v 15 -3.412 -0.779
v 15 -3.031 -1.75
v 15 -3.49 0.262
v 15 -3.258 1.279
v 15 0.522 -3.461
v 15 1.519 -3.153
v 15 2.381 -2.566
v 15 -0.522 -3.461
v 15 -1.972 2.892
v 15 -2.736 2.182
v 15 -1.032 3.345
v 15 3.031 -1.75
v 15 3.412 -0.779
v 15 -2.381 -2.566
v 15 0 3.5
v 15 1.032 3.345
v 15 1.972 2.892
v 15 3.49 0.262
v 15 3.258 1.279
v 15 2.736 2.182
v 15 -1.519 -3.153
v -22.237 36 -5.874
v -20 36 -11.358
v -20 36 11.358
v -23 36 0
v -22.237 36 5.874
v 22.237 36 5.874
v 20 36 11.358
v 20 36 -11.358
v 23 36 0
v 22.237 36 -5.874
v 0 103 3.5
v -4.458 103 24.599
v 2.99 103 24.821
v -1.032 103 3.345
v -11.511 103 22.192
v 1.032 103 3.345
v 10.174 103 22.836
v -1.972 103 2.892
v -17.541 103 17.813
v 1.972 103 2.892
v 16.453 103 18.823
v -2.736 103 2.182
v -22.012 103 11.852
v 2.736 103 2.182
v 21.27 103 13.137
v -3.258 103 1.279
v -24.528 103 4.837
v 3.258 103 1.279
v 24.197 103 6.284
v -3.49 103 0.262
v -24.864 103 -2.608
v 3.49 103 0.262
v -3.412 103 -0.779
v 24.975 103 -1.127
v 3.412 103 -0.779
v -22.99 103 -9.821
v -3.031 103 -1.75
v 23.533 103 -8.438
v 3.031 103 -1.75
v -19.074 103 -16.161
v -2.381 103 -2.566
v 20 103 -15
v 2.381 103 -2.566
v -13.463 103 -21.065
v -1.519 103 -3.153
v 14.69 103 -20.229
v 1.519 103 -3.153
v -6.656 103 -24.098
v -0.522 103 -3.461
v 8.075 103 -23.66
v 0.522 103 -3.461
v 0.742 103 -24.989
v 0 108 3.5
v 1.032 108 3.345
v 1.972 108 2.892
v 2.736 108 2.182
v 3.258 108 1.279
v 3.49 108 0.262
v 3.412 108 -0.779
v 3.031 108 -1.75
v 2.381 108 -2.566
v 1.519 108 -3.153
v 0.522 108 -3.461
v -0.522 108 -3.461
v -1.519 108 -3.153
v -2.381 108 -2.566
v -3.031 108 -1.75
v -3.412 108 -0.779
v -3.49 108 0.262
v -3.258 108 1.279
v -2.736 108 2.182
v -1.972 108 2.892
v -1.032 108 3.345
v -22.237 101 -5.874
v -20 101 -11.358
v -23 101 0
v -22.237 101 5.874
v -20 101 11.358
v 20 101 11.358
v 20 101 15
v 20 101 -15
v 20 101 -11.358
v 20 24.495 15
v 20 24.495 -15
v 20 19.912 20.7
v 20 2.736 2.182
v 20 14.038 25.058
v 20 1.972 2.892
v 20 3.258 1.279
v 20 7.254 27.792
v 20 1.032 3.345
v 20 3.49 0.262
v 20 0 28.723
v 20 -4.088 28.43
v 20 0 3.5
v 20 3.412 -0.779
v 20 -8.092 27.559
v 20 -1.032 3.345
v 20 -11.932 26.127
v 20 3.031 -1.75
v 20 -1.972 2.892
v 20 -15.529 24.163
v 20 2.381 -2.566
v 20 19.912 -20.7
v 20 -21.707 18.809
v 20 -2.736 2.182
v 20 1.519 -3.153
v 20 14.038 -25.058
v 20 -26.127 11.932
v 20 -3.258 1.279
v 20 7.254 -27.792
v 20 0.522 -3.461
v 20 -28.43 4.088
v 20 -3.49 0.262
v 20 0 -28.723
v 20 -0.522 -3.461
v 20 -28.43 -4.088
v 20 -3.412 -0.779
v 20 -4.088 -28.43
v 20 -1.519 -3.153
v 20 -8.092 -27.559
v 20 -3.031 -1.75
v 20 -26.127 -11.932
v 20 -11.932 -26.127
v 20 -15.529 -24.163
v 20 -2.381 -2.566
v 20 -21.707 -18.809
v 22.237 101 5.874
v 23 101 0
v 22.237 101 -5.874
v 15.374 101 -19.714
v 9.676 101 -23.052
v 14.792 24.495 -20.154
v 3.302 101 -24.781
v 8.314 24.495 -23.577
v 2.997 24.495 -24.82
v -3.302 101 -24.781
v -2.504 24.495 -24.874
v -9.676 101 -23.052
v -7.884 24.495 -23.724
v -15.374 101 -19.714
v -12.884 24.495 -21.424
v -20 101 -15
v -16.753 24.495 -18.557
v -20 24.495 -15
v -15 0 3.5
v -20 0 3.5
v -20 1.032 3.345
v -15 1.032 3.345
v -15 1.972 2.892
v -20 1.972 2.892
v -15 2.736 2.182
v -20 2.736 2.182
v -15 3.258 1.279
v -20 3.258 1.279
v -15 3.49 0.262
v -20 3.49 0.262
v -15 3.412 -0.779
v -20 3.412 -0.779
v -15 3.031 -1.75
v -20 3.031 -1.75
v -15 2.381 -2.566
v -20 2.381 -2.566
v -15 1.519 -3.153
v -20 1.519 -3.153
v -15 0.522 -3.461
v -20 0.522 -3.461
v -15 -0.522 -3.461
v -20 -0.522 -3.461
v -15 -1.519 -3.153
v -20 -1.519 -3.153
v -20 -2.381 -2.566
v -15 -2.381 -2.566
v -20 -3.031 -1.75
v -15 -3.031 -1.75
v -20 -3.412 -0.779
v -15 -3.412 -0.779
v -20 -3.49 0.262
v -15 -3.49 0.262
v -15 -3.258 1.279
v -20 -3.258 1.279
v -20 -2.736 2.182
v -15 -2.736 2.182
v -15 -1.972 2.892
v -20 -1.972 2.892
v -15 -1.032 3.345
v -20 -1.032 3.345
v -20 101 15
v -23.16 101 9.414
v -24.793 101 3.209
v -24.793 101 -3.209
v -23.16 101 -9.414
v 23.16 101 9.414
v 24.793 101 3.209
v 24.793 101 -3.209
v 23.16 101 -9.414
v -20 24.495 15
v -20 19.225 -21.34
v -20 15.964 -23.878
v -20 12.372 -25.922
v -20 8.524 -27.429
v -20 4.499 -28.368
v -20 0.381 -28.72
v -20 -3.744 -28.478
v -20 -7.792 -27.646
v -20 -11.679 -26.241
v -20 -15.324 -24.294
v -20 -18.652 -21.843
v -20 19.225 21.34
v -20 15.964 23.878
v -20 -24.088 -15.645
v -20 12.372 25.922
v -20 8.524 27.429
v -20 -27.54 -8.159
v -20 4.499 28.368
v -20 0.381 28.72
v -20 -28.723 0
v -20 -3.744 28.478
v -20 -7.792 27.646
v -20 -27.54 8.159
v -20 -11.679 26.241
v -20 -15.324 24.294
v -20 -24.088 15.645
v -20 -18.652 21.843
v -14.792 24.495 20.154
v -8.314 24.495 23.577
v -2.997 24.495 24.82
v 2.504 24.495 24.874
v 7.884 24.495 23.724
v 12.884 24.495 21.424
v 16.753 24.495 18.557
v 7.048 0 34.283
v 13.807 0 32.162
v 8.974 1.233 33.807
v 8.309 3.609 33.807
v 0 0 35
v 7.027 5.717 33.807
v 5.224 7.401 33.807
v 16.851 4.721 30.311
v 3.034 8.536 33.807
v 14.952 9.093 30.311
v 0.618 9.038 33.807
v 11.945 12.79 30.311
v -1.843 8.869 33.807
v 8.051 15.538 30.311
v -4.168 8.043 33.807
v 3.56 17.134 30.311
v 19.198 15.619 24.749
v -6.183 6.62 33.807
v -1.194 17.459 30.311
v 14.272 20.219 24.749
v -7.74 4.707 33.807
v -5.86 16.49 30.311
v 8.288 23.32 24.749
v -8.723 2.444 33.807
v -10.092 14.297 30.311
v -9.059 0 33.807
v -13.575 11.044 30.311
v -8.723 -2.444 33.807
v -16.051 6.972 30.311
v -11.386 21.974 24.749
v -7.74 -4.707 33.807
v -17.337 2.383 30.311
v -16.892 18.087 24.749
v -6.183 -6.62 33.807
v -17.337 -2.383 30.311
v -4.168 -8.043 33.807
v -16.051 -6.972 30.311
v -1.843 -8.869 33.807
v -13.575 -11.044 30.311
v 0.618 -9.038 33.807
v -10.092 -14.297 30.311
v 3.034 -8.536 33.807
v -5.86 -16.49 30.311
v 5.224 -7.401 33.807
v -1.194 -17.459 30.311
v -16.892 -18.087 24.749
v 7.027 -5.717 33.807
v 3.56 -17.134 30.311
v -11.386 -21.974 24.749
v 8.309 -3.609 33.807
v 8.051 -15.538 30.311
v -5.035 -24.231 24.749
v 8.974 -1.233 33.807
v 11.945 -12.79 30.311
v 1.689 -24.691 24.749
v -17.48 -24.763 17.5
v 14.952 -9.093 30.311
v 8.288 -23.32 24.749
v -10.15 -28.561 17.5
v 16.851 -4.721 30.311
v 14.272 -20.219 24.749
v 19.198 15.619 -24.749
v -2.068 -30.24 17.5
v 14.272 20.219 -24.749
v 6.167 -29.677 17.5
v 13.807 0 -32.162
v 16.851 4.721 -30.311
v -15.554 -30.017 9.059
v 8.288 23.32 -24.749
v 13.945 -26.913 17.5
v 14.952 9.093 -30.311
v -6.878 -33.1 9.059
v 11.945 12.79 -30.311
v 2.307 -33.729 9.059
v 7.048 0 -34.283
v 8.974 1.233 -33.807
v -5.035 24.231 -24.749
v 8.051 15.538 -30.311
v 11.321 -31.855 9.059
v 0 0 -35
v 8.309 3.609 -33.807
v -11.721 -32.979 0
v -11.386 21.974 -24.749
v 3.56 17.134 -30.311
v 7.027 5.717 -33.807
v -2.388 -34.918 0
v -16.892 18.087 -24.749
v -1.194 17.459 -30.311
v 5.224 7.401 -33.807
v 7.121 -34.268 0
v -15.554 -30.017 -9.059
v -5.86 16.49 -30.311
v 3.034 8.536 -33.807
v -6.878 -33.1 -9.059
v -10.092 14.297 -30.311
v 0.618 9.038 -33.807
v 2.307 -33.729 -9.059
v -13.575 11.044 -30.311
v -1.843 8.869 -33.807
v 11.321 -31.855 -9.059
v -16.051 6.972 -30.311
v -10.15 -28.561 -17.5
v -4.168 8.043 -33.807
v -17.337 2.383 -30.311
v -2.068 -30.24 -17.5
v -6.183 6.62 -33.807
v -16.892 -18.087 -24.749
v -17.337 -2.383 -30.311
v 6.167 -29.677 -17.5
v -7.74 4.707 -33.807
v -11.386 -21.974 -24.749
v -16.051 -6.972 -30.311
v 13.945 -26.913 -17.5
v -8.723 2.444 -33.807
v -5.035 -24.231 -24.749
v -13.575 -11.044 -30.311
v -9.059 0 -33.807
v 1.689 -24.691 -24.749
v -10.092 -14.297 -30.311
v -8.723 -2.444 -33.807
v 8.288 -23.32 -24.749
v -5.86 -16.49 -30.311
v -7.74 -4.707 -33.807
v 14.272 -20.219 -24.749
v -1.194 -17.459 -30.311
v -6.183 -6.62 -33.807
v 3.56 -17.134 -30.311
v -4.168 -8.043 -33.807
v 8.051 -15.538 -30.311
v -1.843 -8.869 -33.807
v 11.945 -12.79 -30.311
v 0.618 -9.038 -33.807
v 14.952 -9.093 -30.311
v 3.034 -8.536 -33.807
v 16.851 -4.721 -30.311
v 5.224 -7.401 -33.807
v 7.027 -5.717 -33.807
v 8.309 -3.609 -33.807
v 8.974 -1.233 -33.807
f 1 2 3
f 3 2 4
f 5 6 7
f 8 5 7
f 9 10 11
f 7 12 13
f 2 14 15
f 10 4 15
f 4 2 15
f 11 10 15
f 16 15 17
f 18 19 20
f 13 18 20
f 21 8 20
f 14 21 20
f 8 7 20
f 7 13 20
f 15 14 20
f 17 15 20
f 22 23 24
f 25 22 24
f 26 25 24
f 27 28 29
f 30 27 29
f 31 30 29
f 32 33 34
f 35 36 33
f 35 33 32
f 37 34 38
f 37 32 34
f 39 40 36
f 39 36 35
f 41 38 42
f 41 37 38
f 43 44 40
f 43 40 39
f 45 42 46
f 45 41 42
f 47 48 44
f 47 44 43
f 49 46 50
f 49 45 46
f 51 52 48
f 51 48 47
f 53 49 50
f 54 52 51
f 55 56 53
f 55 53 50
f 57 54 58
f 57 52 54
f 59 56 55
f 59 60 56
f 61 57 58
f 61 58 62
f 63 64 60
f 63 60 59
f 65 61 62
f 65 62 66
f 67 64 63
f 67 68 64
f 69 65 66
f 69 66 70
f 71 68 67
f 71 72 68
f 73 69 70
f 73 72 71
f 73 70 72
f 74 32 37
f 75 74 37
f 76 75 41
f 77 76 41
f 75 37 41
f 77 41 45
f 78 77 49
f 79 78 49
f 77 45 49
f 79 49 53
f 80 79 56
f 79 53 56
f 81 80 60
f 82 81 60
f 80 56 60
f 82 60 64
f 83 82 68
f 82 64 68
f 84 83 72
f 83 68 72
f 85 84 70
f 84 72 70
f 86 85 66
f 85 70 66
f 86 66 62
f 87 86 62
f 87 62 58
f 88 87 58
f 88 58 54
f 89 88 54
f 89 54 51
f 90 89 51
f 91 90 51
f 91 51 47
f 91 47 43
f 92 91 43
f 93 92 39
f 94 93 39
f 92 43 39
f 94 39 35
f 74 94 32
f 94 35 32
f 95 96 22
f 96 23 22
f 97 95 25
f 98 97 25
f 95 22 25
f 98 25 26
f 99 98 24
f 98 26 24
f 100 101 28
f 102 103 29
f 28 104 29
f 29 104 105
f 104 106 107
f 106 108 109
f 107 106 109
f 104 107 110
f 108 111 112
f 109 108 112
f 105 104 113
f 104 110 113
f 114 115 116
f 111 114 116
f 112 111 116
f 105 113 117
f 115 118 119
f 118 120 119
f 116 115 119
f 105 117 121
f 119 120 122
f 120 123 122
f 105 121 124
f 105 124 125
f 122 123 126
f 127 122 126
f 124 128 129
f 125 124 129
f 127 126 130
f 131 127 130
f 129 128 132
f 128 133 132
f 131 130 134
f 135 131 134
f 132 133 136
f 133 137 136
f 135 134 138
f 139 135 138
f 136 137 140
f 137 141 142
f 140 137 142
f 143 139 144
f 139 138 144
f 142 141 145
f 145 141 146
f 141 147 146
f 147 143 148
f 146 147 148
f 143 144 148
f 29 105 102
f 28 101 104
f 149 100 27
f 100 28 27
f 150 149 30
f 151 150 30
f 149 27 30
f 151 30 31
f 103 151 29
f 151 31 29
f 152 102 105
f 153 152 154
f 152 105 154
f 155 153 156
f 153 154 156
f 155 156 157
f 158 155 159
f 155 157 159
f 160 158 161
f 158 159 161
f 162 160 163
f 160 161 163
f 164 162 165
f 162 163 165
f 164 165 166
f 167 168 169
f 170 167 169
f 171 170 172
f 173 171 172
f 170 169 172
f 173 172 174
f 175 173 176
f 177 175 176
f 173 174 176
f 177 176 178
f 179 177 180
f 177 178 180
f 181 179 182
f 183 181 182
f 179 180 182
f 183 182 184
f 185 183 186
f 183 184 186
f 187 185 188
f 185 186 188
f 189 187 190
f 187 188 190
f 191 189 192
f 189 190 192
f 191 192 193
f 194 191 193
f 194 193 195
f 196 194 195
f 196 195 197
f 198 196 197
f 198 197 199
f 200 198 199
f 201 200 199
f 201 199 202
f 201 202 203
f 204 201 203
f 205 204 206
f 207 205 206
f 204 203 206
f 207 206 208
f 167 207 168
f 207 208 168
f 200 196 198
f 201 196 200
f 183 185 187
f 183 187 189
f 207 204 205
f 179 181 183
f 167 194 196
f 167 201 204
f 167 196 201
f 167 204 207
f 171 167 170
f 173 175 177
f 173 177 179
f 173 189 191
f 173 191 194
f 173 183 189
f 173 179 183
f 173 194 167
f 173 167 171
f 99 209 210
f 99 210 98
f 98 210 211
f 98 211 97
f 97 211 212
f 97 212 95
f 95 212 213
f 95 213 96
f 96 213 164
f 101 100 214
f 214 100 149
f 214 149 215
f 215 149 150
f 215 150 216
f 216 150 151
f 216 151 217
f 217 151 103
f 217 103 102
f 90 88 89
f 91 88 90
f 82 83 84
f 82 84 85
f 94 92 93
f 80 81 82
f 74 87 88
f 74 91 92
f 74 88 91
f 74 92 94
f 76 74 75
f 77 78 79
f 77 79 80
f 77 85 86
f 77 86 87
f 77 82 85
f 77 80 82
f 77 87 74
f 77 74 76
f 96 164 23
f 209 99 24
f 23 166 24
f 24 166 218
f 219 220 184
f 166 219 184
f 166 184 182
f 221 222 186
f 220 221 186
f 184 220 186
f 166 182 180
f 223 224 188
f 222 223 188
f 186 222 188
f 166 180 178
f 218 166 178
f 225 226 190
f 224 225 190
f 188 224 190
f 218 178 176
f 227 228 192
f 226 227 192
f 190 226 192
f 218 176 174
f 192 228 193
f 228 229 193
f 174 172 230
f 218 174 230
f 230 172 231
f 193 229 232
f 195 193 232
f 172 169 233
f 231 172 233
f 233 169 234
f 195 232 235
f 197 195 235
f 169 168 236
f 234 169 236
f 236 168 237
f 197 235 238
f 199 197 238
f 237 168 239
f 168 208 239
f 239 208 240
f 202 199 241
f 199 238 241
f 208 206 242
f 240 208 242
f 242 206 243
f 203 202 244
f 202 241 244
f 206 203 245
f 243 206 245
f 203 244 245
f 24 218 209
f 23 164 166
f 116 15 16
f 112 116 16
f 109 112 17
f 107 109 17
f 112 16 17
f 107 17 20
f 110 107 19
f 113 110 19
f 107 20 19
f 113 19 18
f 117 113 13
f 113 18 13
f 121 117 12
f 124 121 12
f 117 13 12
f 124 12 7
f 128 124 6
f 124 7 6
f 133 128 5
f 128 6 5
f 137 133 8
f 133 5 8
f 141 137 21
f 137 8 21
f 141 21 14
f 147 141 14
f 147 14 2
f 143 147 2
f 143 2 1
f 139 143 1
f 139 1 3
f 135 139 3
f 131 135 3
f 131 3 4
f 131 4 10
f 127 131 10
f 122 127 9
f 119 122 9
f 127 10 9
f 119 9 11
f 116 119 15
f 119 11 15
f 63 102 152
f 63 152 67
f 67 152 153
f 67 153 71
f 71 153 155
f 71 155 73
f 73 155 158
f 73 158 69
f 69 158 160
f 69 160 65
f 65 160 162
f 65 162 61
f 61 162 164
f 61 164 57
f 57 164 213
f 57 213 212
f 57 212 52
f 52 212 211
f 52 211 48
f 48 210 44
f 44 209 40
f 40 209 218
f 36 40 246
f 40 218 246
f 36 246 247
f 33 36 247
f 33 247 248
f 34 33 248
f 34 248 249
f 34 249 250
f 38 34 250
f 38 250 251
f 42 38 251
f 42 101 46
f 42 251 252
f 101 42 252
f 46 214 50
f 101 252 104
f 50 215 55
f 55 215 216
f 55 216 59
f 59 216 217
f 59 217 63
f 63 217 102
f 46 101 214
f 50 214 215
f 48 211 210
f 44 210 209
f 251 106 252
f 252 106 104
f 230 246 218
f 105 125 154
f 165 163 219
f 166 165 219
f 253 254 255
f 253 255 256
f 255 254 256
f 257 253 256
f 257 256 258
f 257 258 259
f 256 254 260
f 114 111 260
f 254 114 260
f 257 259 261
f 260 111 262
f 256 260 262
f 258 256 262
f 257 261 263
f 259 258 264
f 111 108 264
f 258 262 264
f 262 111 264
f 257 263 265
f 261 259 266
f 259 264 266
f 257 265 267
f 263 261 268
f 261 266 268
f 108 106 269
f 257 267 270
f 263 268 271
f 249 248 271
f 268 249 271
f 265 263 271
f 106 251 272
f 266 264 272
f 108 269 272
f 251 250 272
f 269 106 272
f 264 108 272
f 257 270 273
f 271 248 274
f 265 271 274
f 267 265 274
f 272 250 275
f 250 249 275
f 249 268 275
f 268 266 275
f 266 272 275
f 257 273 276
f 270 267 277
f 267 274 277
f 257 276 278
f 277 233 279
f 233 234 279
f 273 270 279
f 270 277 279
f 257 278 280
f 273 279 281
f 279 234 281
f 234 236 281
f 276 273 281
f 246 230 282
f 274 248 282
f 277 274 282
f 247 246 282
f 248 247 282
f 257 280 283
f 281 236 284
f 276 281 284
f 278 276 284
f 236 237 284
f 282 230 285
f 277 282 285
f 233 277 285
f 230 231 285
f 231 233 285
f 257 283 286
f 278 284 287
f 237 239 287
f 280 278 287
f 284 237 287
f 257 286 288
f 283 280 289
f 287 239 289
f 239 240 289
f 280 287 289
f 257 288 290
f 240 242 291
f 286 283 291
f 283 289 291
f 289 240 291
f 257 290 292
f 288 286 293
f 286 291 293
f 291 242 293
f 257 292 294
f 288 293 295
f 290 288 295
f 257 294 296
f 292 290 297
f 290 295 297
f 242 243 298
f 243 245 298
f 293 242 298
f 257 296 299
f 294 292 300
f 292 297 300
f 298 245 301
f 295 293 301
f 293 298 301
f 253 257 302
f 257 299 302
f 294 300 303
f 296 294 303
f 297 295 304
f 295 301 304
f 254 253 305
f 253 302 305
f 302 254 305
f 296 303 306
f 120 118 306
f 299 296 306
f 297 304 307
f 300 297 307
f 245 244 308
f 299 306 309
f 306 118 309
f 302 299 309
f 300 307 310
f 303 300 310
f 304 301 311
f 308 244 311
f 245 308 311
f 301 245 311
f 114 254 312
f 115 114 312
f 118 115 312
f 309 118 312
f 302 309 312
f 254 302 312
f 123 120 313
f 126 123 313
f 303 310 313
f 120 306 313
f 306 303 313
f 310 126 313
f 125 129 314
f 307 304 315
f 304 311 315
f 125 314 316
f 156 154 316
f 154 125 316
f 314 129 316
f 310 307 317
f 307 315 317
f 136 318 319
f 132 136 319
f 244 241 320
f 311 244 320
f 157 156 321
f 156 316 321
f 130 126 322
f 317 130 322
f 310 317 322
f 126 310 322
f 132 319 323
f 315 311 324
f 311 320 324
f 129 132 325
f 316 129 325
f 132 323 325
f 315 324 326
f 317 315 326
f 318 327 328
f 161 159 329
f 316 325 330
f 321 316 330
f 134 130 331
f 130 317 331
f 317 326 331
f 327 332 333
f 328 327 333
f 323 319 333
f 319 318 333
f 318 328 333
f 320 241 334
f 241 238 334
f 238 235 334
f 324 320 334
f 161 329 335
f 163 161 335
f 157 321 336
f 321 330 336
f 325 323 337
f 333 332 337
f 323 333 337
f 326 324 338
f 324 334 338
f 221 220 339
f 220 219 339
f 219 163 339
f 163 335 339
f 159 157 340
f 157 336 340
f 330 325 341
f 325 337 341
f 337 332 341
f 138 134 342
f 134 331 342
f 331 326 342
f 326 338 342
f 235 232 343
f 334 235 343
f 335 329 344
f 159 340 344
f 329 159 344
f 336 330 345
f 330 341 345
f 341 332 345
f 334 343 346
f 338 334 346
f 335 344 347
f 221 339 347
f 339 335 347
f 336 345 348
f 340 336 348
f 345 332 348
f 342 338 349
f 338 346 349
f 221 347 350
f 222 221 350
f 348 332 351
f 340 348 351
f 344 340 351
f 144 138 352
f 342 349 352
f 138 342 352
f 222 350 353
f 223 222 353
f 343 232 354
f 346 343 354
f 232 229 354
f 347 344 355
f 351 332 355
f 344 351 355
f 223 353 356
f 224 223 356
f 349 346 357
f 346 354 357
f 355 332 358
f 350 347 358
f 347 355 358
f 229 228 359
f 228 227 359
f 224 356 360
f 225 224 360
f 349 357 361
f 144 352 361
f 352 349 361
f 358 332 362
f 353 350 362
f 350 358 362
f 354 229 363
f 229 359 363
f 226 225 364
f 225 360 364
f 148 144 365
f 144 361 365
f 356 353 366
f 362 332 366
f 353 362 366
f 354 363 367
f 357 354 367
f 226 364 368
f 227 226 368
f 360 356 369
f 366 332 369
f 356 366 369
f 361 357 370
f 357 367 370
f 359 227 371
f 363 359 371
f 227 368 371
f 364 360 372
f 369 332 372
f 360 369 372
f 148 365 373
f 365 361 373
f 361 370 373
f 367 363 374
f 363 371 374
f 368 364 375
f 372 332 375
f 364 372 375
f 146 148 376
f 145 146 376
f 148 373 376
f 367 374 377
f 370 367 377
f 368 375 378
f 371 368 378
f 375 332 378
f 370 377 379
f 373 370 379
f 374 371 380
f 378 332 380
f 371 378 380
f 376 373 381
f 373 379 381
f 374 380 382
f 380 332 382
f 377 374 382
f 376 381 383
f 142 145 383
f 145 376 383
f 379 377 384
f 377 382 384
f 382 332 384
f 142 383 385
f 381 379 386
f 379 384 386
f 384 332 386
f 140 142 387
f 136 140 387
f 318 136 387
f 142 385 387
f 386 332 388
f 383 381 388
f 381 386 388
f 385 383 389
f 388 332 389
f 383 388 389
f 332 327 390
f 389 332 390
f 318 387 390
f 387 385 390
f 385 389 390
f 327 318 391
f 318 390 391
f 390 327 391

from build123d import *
from build123d.topology import SkipClean

# Parameters (mm, degrees)
CUT_EXTRUDE1_DEPTH      = 35
CUT_EXTRUDE1_DEPTH_BACK = 35
SKETCH2_OUTSIDE_W       = 96.248
SKETCH2_OUTSIDE_H       = 96.248
BOSS_EXTRUDE1_DEPTH     = 36
SKETCH4_R               = 3.5
CUT_EXTRUDE2_DEPTH      = 5
LPATTERN1_COUNT         = 2
LPATTERN1_PITCH         = 35
BOSS_EXTRUDE2_DEPTH     = 50
BOSS_EXTRUDE6_DEPTH     = 15
SKETCH10_R              = 25
BOSS_EXTRUDE7_DEPTH     = 2
SKETCH11_R              = 3.5
BOSS_EXTRUDE8_DEPTH     = 5


with BuildPart() as part:
    # Sketch1 → Revolve2 (revolve)
    with BuildSketch(Plane(origin=(0, 0, 0), x_dir=(1, 0, 0), z_dir=(0, 1, 0))):
        with BuildLine():
            Line((0, 35), (0, -35))
            ThreePointArc((0, -35), (35, 0), (0, 35))
        make_face()
    revolve(axis=Axis((0, 0, -35), (0, 0, 1)))

    # Sketch2 outside → Cut-Extrude1 (cut, two sides: drawn at the far end of the back side and taken through both)
    with SkipClean():  # the faces are left unmerged after this step: merging them gives an invalid solid
        with BuildSketch(Plane(origin=(0, 0, 0), x_dir=(1, 0, 0), z_dir=(0, 1, 0)).offset(-CUT_EXTRUDE1_DEPTH_BACK)):
            Rectangle(SKETCH2_OUTSIDE_W, SKETCH2_OUTSIDE_H)
            with BuildLine():
                Line((-20, -28.722813233), (-20, 28.722813233))
                ThreePointArc((-20, 28.722813233), (0, 35), (20, 28.722813233))
                Line((20, 28.722813233), (20, -28.722813233))
                ThreePointArc((20, -28.722813233), (0, -35), (-20, -28.722813233))
            make_face(mode=Mode.SUBTRACT)
        extrude(amount=CUT_EXTRUDE1_DEPTH + CUT_EXTRUDE1_DEPTH_BACK, mode=Mode.SUBTRACT)

    # Sketch3 → Boss-Extrude1 (add)
    with BuildSketch(Plane(origin=(0, 0, 0), x_dir=(1, 0, 0), z_dir=(0, 1, 0))):
        with BuildLine():
            Line((-20, 15), (-20, -15))
            ThreePointArc((-20, -15), (0, -25), (20, -15))
            Line((20, -15), (20, 15))
            ThreePointArc((20, 15), (0, 25), (-20, 15))
        make_face()
    extrude(amount=BOSS_EXTRUDE1_DEPTH)

    # Sketch4 → Cut-Extrude2 (cut)
    with BuildSketch(Plane.ZY.offset(20)):
        Circle(SKETCH4_R)
    cut_extrude2 = extrude(amount=-CUT_EXTRUDE2_DEPTH, mode=Mode.SUBTRACT)

    # LPattern1: Cut-Extrude2 ×2
    with Locations(*[(i * LPATTERN1_PITCH, 0, 0) for i in range(1, LPATTERN1_COUNT)]):
        add(cut_extrude2, mode=Mode.SUBTRACT)

    # Sketch5 → Boss-Extrude2 (add)
    with BuildSketch(Plane(origin=(0, 36, 0), x_dir=(1, 0, 0), z_dir=(0, 1, 0))):
        with BuildLine():
            Line((-20, 15), (-20, 11.357816692))
            ThreePointArc((-20, 11.357816692), (-23, 0), (-20, -11.357816692))
            Line((-20, -11.357816692), (-20, -15))
            ThreePointArc((-20, -15), (0, -25), (20, -15))
            Line((20, -15), (20, -11.357816692))
            ThreePointArc((20, -11.357816692), (23, 0), (20, 11.357816692))
            Line((20, 11.357816692), (20, 15))
            ThreePointArc((20, 15), (0, 25), (-20, 15))
        make_face()
    extrude(amount=BOSS_EXTRUDE2_DEPTH)

    # Sketch9 → Boss-Extrude6 (add)
    with BuildSketch(Plane(origin=(0, 86, 0), x_dir=(1, 0, 0), z_dir=(0, 1, 0))):
        with BuildLine():
            Line((20, 11.357816692), (20, 15))
            ThreePointArc((20, 15), (0, 25), (-20, 15))
            Line((-20, 15), (-20, 11.357816692))
            ThreePointArc((-20, 11.357816692), (-23, 0), (-20, -11.357816692))
            Line((-20, -11.357816692), (-20, -15))
            ThreePointArc((-20, -15), (0, -25), (20, -15))
            Line((20, -15), (20, -11.357816692))
            ThreePointArc((20, -11.357816692), (23, 0), (20, 11.357816692))
        make_face()
    extrude(amount=BOSS_EXTRUDE6_DEPTH)

    # Sketch10 → Boss-Extrude7 (add)
    with BuildSketch(Plane(origin=(0, 101, 0), x_dir=(1, 0, 0), z_dir=(0, 1, 0))):
        with Locations(Location((0, 0, 0), (0, 0, 36.869897646))):
            Circle(SKETCH10_R)
    extrude(amount=BOSS_EXTRUDE7_DEPTH)

    # Sketch11 → Boss-Extrude8 (add)
    with BuildSketch(Plane(origin=(0, 103, 0), x_dir=(1, 0, 0), z_dir=(0, 1, 0))):
        with Locations(Location((0, 0, 0), (0, 0, 270))):
            Circle(SKETCH11_R)
    extrude(amount=BOSS_EXTRUDE8_DEPTH)


solid = part.part
